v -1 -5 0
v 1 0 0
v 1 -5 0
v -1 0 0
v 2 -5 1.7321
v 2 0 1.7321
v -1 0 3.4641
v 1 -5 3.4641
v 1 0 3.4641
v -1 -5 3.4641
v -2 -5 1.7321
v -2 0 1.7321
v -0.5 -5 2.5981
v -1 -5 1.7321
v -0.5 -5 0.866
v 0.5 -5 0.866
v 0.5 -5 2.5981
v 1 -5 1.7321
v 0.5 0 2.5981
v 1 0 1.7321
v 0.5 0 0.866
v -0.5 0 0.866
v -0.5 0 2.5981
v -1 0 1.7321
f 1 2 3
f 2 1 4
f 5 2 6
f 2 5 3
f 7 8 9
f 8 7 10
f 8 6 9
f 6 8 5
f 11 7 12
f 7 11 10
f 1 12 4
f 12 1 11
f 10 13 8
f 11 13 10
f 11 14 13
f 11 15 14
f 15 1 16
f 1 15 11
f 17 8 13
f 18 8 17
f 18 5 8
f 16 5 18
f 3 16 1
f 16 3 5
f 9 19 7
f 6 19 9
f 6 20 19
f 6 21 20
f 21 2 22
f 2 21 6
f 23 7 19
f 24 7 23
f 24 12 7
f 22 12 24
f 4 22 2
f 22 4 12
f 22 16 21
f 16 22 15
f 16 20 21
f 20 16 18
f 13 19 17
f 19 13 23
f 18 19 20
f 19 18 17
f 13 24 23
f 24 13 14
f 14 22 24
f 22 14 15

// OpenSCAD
module peg(d, l) {
    half_width = sqrt(3*d)/2;
    translate([0,0,half_width])
    rotate([90,0,0])
    difference() {
        cylinder(d = d, l, $fn=6);
        translate([0,0,-0.5])
        cylinder(d = d/2, l+1, $fn=6);
    }
}

peg(d=4, l=5);
